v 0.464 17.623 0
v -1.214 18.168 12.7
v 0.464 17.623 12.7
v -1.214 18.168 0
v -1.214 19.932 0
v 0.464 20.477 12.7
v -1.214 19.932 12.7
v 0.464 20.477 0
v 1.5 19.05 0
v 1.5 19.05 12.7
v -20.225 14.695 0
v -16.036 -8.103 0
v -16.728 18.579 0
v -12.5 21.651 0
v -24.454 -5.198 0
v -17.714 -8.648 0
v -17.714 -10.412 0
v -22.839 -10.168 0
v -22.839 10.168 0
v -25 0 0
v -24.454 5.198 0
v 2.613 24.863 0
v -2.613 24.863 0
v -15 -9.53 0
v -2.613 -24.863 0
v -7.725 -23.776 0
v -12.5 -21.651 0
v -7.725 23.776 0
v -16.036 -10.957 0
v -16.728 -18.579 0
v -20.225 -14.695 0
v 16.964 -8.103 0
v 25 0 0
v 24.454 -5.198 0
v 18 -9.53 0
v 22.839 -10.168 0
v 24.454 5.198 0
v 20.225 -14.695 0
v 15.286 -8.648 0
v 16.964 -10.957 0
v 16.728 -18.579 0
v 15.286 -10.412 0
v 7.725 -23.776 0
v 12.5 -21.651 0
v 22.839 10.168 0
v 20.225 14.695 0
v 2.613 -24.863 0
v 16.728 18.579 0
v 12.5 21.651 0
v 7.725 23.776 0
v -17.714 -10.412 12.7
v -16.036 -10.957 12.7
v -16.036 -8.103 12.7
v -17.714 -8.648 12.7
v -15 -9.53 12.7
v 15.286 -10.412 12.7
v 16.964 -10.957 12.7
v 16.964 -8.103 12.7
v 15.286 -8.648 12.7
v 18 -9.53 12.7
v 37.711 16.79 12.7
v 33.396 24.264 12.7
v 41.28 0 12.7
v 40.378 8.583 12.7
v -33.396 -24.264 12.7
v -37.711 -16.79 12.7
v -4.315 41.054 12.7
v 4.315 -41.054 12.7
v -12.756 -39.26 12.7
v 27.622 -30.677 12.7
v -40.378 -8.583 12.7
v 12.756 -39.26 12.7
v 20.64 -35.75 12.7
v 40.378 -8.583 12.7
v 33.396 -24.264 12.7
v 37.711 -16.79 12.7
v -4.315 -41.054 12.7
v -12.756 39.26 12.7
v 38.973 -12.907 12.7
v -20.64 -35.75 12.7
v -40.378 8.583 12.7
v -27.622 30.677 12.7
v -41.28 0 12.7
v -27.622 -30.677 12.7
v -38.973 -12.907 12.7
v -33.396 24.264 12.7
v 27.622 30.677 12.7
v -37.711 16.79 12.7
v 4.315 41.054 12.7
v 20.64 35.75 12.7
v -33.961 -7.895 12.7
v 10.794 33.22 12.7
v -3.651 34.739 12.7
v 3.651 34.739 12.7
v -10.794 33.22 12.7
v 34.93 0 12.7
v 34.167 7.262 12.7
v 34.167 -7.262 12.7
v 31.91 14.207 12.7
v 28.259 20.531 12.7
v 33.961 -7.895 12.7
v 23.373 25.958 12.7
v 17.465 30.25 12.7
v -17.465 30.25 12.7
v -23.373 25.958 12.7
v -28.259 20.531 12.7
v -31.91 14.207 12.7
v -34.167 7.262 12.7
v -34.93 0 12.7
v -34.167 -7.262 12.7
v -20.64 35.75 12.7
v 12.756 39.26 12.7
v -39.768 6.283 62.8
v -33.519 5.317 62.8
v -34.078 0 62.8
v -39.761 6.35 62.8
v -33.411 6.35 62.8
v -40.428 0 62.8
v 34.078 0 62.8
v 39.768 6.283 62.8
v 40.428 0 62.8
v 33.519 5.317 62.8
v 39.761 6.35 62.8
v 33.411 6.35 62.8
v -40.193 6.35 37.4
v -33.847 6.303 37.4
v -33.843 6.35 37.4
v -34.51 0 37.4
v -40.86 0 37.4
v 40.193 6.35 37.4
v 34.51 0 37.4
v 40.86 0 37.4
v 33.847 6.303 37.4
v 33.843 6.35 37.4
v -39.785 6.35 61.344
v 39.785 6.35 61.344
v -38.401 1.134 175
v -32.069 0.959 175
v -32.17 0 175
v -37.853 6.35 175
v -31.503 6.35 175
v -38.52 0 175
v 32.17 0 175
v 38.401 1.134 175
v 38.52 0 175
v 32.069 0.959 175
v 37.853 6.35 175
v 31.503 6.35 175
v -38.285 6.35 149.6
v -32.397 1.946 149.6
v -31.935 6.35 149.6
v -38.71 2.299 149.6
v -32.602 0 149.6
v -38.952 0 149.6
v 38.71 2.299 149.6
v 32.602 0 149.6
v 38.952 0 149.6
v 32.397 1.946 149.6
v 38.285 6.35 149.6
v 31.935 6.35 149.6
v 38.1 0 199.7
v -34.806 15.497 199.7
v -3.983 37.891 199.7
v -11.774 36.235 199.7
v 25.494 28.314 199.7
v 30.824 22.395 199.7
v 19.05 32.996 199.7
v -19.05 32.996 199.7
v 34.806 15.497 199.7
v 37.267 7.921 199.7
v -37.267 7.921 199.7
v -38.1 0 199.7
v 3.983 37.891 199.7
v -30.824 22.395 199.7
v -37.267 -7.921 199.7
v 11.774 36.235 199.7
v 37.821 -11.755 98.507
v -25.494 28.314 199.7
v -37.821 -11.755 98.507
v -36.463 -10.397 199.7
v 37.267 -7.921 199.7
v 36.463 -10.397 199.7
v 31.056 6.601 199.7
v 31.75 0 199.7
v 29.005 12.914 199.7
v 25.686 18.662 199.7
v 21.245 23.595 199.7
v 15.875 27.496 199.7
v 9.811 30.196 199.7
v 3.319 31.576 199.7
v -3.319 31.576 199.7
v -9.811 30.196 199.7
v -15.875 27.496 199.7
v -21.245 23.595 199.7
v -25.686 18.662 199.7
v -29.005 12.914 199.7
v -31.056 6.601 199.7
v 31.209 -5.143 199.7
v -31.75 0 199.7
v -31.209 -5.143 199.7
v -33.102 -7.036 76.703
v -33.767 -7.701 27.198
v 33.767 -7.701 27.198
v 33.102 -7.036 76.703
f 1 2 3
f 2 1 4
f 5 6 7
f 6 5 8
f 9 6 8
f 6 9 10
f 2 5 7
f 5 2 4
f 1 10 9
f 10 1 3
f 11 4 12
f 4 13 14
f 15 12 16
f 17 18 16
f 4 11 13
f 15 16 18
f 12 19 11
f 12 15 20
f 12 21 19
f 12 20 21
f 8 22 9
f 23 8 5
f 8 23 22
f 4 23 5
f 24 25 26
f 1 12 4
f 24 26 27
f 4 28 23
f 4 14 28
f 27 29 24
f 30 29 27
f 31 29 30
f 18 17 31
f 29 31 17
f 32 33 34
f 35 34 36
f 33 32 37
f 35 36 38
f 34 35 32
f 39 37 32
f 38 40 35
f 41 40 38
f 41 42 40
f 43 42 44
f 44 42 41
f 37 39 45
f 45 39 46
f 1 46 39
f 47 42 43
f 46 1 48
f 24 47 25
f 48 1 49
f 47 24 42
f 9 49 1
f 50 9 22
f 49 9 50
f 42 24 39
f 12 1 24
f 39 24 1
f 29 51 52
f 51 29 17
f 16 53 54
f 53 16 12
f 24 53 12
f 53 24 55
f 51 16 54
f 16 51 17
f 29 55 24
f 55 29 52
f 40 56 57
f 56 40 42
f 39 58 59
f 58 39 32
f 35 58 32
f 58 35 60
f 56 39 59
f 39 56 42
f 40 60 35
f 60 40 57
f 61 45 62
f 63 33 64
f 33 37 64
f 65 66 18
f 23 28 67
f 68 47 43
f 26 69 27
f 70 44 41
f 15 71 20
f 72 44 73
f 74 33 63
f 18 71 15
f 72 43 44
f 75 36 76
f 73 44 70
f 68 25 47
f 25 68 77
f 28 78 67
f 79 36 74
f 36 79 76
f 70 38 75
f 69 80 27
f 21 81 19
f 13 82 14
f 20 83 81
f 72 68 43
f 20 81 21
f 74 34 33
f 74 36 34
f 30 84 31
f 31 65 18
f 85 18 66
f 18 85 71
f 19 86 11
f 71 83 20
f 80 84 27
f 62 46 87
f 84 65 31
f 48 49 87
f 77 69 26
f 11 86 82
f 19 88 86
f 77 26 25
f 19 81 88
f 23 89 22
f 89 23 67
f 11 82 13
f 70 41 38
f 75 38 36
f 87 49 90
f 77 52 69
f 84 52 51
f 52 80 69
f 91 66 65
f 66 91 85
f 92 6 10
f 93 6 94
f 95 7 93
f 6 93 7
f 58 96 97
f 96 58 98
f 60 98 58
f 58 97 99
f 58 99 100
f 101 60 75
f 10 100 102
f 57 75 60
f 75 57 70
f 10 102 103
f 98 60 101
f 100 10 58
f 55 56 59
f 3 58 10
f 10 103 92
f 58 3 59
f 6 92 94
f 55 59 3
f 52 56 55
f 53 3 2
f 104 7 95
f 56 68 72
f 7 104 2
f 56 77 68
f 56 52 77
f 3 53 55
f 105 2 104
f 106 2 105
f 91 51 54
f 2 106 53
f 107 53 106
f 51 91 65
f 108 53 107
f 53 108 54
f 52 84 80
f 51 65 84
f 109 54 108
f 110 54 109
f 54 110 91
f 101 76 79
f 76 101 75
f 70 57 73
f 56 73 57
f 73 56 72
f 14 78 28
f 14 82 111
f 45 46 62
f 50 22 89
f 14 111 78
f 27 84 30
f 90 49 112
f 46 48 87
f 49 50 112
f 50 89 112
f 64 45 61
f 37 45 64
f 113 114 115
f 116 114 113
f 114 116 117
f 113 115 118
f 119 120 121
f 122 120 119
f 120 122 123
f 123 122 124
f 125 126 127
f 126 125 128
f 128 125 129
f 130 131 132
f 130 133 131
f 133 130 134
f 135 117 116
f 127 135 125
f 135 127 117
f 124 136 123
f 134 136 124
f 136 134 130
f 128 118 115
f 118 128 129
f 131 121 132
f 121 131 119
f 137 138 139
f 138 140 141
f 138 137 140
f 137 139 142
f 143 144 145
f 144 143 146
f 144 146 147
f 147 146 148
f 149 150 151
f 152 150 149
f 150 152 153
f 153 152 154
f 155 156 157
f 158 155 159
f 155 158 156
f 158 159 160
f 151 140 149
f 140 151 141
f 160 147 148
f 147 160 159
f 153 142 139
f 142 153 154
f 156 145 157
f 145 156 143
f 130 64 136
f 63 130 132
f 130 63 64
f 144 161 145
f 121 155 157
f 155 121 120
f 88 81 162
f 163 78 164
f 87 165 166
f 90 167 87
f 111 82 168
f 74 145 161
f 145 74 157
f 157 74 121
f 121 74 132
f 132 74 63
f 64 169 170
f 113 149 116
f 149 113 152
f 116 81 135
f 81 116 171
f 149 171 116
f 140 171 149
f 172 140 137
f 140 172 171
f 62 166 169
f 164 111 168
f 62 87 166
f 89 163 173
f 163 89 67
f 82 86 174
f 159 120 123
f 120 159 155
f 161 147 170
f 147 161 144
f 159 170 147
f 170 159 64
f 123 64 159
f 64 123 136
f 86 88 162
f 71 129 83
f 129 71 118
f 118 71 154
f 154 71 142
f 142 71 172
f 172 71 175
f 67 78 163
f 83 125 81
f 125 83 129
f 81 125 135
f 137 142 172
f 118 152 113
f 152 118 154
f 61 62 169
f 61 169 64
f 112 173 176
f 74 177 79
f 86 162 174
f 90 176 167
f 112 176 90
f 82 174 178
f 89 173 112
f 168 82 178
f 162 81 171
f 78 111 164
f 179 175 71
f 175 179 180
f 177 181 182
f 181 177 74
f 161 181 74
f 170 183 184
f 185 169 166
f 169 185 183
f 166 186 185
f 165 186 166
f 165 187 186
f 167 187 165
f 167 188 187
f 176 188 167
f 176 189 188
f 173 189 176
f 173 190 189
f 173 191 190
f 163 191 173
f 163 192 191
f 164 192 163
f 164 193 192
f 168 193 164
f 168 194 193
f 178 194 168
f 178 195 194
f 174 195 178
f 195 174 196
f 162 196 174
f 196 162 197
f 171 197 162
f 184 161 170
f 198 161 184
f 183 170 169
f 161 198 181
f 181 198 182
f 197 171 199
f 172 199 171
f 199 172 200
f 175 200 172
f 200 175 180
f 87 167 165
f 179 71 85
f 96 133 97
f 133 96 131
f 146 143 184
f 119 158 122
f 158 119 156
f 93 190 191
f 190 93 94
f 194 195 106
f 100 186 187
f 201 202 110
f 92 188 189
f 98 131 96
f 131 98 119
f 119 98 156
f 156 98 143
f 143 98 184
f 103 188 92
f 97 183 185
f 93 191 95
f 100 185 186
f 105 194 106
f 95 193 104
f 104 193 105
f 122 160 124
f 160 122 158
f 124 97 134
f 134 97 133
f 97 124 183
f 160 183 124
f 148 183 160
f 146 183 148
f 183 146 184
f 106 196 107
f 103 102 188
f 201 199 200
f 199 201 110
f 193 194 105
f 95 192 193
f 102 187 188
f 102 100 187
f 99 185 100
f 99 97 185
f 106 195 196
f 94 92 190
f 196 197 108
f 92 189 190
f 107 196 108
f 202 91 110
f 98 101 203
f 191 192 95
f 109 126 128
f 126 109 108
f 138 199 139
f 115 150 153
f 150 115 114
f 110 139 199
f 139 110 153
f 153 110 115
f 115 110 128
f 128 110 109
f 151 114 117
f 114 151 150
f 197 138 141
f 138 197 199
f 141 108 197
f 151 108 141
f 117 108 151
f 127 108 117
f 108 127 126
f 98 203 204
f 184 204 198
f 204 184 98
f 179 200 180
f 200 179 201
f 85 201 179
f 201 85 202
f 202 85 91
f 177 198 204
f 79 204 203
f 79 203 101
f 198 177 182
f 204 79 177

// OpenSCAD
// - Screw Diameter (mm) (default=3)
screwsize = 3; //[3,4,5]
// - Major Diameter (mm) (default=82.56)
majordia = 82.56; // [82.56:100]
// - Forearm Diameter (mm) (default=76.2)
forearmdia = 76.2; // [76.2:95]
// - Faceplate Diameter (mm) (default=50)
faceplatedia = 50; // [50:100]
// - Wall Thickness (mm) (default=6.35)
wallthickness = 6.35; // [6.35:10]
// - Arm Length (mm) (default=187)
armlength = 187; // [100:200]
// - Strap Slot Width (mm) (default=25.4)
strapwidth = 25.4; // [12:30]
// - Strap Slot Height (mm) (deafult=6.35)
strapthickness = 6.35; // [4:8]
module faceplate(){
cylinder (h=12.7,r1=faceplatedia/2, r2=majordia/2);
}
module mountingholes (){ 
translate([0,19.05,0]) cylinder(h=50,r1=screwsize/2,r2=screwsize/2); 
translate([-16.50,-9.530,0]) cylinder(h=50,r1=screwsize/2,r2=screwsize/2);
translate([16.50,-9.530,0]) cylinder(h=50,r1=screwsize/2,r2=screwsize/2);
}   
module outerdia(){
translate([0,0,12.7])
cylinder (h=armlength,r1=majordia/2,r2=forearmdia/2);
}
module innerdia (){
translate([0,0,12.7])
cylinder (h=armlength,r1=(majordia/2)-wallthickness,r2=(forearmdia/2)-wallthickness);
}
module armslot(){
translate([0,-80,12.7])
rotate([0,0,45])
cube([75,75,armlength]);
}
module straps (){
translate ([-150,0,armlength/5])
cube ([300,strapthickness,strapwidth]);
translate ([-150,0,armlength-(armlength/5)])
cube ([300,strapthickness,strapwidth]);    
}
difference (){
    faceplate();
    mountingholes();
}
difference(){
    outerdia();
    innerdia();
    armslot();
    straps();
}
